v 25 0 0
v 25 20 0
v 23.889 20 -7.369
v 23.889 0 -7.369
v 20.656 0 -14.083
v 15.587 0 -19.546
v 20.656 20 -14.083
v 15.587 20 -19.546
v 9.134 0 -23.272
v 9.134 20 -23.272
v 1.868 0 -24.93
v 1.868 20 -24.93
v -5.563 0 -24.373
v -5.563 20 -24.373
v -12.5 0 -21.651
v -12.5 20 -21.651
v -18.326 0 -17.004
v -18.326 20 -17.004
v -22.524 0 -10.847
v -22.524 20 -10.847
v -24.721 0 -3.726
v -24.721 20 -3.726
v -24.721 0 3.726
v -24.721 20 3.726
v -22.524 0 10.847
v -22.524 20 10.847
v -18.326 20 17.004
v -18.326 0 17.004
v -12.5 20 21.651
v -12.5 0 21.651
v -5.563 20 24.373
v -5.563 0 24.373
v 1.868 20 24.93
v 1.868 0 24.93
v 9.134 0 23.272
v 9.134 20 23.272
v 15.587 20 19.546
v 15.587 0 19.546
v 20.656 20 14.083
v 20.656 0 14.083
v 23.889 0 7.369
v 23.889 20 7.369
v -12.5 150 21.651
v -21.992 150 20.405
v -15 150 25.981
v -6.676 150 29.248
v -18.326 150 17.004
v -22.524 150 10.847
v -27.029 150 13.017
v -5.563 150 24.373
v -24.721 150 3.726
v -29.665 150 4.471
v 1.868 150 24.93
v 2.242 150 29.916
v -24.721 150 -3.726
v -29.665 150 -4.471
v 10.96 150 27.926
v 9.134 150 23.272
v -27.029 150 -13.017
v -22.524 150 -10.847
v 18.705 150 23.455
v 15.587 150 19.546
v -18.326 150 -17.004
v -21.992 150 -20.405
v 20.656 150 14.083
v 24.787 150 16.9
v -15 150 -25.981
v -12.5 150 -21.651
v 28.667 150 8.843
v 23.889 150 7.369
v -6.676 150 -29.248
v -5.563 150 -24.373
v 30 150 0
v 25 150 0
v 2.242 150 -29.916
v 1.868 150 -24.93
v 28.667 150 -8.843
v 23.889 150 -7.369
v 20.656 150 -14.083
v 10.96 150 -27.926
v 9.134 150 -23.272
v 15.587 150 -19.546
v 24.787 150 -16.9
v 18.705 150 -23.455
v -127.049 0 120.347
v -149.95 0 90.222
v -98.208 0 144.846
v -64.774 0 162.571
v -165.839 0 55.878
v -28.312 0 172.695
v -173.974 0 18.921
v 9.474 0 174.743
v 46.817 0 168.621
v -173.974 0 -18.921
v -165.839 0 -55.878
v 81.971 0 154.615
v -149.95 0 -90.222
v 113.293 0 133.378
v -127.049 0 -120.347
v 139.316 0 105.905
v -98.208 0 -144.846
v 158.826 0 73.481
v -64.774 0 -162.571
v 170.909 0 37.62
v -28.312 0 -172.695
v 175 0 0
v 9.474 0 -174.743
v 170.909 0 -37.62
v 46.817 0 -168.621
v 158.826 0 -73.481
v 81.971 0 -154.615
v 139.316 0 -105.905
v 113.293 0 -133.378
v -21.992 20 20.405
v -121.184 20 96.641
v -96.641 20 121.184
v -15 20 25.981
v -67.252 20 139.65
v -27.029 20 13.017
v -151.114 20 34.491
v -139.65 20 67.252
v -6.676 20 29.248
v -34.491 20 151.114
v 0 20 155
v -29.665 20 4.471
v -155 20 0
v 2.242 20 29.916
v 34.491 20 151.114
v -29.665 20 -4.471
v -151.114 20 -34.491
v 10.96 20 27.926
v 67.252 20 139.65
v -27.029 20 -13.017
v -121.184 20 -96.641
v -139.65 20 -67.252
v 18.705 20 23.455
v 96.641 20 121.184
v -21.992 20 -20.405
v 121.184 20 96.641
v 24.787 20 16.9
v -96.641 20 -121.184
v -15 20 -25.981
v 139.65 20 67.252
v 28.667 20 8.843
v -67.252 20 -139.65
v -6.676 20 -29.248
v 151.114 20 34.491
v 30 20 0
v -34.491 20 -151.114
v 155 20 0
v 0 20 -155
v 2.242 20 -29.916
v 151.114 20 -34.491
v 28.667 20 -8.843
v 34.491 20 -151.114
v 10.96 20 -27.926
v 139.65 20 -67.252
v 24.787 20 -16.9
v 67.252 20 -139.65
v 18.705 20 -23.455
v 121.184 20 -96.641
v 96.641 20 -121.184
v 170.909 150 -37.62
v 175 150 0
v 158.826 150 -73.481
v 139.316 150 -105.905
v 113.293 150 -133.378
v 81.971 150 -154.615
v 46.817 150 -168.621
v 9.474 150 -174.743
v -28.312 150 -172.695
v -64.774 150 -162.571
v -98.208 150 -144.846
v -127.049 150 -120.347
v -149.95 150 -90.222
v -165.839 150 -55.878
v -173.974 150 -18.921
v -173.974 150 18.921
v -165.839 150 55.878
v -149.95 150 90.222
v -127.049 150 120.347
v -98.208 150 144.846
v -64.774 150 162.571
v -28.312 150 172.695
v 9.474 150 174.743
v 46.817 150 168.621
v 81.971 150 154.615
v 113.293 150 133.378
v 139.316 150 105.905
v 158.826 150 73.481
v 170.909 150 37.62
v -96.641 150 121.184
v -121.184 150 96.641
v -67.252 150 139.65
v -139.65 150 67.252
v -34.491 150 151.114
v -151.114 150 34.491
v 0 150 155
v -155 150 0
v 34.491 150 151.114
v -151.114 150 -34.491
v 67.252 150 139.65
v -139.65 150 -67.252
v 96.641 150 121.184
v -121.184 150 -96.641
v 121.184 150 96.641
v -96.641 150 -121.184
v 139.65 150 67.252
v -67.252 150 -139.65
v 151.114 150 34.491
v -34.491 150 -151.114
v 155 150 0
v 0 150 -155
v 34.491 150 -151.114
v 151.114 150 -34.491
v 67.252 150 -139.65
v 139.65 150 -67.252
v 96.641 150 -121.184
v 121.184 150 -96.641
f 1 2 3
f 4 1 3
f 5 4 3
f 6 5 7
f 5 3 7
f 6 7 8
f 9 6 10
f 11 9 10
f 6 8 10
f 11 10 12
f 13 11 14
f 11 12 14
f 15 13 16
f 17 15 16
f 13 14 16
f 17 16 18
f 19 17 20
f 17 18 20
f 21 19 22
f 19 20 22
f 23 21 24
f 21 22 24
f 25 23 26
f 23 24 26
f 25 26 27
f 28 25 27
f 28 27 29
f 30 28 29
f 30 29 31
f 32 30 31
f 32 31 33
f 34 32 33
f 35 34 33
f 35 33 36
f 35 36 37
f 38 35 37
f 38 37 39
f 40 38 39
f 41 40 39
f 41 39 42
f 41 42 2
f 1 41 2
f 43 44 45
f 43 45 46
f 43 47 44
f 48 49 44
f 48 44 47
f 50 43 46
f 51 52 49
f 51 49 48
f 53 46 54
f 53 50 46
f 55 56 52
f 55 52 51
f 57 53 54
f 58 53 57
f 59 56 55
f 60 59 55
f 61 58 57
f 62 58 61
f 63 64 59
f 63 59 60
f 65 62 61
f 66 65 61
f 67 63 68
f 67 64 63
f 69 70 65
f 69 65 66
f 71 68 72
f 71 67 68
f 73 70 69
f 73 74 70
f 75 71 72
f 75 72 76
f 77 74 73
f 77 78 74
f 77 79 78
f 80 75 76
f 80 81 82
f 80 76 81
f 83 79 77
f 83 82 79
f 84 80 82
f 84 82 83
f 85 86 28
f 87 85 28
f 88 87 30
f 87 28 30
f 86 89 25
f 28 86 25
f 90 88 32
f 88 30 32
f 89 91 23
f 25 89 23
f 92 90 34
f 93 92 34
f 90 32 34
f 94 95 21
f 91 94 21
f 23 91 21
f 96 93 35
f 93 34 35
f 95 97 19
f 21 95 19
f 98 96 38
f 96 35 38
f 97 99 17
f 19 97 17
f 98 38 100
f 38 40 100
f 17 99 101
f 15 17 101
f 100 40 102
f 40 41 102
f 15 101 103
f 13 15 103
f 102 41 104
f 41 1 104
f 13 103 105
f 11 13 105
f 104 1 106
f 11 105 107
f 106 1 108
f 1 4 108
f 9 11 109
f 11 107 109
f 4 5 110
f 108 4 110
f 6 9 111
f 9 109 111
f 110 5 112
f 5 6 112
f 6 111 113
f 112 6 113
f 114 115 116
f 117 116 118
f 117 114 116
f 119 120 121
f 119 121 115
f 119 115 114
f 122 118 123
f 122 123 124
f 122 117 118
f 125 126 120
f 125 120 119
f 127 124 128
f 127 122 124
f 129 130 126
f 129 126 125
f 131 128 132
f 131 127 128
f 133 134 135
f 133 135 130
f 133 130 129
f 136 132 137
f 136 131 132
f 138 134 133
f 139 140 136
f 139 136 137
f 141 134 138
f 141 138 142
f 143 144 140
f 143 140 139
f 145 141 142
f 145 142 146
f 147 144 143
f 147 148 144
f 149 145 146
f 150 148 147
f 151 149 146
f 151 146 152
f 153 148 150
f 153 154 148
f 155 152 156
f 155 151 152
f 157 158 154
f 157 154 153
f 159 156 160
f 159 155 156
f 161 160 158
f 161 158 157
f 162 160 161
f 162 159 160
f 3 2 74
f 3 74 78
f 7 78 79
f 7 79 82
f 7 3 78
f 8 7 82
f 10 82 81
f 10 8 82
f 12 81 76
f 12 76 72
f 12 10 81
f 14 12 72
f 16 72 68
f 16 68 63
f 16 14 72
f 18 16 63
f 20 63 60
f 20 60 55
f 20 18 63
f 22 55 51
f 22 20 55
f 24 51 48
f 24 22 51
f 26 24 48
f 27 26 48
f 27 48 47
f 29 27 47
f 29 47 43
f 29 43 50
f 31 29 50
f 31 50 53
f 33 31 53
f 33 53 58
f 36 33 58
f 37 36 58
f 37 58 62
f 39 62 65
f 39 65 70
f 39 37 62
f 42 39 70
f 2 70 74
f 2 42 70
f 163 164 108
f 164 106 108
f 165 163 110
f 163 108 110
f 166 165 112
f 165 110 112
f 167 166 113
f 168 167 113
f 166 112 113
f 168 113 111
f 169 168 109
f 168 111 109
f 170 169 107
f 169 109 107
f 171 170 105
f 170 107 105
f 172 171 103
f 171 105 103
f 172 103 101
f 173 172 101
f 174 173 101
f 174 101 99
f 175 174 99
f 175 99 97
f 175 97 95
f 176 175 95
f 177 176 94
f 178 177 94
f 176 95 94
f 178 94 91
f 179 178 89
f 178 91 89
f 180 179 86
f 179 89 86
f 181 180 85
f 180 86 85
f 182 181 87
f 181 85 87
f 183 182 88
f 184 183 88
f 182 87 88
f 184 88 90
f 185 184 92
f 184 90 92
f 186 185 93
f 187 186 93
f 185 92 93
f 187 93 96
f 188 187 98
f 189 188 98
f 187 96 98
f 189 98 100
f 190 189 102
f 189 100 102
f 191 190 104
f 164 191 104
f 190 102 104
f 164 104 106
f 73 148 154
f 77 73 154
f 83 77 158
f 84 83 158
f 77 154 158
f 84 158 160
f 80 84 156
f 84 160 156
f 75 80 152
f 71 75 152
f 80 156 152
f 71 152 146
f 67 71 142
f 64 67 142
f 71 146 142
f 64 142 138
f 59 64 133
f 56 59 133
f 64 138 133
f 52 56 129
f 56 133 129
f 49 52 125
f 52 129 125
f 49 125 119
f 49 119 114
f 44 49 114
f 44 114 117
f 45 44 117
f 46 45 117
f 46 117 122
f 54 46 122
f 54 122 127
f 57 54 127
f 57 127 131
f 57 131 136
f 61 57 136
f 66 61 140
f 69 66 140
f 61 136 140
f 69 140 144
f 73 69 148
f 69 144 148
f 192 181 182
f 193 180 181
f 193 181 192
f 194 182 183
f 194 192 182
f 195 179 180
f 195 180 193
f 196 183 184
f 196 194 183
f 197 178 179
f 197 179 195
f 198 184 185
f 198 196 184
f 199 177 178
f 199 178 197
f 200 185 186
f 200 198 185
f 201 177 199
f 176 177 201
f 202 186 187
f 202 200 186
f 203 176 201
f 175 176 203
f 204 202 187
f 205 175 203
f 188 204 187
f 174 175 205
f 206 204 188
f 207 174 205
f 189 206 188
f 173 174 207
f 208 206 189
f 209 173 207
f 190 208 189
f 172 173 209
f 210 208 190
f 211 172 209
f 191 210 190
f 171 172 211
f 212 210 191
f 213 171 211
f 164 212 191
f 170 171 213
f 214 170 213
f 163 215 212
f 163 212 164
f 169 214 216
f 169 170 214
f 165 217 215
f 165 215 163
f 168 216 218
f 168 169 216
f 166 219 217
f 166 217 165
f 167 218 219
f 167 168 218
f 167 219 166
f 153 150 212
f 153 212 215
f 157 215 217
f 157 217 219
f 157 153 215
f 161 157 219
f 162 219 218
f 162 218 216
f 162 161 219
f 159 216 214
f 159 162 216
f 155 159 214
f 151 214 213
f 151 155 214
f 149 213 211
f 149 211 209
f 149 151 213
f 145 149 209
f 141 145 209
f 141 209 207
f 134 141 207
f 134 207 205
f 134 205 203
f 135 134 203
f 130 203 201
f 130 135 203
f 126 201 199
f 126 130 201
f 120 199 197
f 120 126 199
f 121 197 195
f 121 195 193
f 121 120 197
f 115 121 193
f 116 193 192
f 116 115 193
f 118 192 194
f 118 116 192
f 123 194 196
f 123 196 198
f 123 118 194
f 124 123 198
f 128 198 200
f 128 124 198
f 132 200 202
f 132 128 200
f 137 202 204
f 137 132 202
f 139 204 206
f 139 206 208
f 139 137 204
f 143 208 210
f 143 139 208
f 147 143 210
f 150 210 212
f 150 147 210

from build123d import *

# Parameters (mm, degrees)
ESBO_O1_R                  = 175
RESSALTO_EXTRUS_O1_DEPTH   = 20
ESBO_O3_R                  = 175
ESBO_O3_R_2                = 155
RESSALTO_EXTRUS_O3_DEPTH   = 130
ESBO_O4_R                  = 25
CORTE_EXTRUS_O1_DEPTH      = 131
CORTE_EXTRUS_O1_DEPTH_BACK = 21
ESBO_O5_R                  = 30
ESBO_O5_R_2                = 25
RESSALTO_EXTRUS_O4_DEPTH   = 130


with BuildPart() as part:
    # Esboço1 → Ressalto-extrusão1 (new body)
    with BuildSketch(Plane(origin=(0, 0, 0), x_dir=(1, 0, 0), z_dir=(0, 1, 0))):
        Circle(ESBO_O1_R)
    extrude(amount=RESSALTO_EXTRUS_O1_DEPTH)

    # Esboço3 → Ressalto-extrusão3 (add)
    with BuildSketch(Plane(origin=(0, 20, 0), x_dir=(1, 0, 0), z_dir=(0, 1, 0))):
        Circle(ESBO_O3_R)
        Circle(ESBO_O3_R_2, mode=Mode.SUBTRACT)
    extrude(amount=RESSALTO_EXTRUS_O3_DEPTH)

    # Esboço4 → Corte-extrusão1 (cut, two sides)
    with BuildSketch(Plane(origin=(0, 20, 0), x_dir=(1, 0, 0), z_dir=(0, 1, 0))) as corte_extrus_o1_sk:
        Circle(ESBO_O4_R)
    extrude(amount=CORTE_EXTRUS_O1_DEPTH, mode=Mode.SUBTRACT)
    extrude(corte_extrus_o1_sk.sketch, amount=-CORTE_EXTRUS_O1_DEPTH_BACK, mode=Mode.SUBTRACT)

    # Esboço5 → Ressalto-extrusão4 (add, through all)
    with BuildSketch(Plane(origin=(0, 20, 0), x_dir=(1, 0, 0), z_dir=(0, 1, 0))):
        Circle(ESBO_O5_R)
        Circle(ESBO_O5_R_2, mode=Mode.SUBTRACT)
    extrude(amount=RESSALTO_EXTRUS_O4_DEPTH)


solid = part.part
